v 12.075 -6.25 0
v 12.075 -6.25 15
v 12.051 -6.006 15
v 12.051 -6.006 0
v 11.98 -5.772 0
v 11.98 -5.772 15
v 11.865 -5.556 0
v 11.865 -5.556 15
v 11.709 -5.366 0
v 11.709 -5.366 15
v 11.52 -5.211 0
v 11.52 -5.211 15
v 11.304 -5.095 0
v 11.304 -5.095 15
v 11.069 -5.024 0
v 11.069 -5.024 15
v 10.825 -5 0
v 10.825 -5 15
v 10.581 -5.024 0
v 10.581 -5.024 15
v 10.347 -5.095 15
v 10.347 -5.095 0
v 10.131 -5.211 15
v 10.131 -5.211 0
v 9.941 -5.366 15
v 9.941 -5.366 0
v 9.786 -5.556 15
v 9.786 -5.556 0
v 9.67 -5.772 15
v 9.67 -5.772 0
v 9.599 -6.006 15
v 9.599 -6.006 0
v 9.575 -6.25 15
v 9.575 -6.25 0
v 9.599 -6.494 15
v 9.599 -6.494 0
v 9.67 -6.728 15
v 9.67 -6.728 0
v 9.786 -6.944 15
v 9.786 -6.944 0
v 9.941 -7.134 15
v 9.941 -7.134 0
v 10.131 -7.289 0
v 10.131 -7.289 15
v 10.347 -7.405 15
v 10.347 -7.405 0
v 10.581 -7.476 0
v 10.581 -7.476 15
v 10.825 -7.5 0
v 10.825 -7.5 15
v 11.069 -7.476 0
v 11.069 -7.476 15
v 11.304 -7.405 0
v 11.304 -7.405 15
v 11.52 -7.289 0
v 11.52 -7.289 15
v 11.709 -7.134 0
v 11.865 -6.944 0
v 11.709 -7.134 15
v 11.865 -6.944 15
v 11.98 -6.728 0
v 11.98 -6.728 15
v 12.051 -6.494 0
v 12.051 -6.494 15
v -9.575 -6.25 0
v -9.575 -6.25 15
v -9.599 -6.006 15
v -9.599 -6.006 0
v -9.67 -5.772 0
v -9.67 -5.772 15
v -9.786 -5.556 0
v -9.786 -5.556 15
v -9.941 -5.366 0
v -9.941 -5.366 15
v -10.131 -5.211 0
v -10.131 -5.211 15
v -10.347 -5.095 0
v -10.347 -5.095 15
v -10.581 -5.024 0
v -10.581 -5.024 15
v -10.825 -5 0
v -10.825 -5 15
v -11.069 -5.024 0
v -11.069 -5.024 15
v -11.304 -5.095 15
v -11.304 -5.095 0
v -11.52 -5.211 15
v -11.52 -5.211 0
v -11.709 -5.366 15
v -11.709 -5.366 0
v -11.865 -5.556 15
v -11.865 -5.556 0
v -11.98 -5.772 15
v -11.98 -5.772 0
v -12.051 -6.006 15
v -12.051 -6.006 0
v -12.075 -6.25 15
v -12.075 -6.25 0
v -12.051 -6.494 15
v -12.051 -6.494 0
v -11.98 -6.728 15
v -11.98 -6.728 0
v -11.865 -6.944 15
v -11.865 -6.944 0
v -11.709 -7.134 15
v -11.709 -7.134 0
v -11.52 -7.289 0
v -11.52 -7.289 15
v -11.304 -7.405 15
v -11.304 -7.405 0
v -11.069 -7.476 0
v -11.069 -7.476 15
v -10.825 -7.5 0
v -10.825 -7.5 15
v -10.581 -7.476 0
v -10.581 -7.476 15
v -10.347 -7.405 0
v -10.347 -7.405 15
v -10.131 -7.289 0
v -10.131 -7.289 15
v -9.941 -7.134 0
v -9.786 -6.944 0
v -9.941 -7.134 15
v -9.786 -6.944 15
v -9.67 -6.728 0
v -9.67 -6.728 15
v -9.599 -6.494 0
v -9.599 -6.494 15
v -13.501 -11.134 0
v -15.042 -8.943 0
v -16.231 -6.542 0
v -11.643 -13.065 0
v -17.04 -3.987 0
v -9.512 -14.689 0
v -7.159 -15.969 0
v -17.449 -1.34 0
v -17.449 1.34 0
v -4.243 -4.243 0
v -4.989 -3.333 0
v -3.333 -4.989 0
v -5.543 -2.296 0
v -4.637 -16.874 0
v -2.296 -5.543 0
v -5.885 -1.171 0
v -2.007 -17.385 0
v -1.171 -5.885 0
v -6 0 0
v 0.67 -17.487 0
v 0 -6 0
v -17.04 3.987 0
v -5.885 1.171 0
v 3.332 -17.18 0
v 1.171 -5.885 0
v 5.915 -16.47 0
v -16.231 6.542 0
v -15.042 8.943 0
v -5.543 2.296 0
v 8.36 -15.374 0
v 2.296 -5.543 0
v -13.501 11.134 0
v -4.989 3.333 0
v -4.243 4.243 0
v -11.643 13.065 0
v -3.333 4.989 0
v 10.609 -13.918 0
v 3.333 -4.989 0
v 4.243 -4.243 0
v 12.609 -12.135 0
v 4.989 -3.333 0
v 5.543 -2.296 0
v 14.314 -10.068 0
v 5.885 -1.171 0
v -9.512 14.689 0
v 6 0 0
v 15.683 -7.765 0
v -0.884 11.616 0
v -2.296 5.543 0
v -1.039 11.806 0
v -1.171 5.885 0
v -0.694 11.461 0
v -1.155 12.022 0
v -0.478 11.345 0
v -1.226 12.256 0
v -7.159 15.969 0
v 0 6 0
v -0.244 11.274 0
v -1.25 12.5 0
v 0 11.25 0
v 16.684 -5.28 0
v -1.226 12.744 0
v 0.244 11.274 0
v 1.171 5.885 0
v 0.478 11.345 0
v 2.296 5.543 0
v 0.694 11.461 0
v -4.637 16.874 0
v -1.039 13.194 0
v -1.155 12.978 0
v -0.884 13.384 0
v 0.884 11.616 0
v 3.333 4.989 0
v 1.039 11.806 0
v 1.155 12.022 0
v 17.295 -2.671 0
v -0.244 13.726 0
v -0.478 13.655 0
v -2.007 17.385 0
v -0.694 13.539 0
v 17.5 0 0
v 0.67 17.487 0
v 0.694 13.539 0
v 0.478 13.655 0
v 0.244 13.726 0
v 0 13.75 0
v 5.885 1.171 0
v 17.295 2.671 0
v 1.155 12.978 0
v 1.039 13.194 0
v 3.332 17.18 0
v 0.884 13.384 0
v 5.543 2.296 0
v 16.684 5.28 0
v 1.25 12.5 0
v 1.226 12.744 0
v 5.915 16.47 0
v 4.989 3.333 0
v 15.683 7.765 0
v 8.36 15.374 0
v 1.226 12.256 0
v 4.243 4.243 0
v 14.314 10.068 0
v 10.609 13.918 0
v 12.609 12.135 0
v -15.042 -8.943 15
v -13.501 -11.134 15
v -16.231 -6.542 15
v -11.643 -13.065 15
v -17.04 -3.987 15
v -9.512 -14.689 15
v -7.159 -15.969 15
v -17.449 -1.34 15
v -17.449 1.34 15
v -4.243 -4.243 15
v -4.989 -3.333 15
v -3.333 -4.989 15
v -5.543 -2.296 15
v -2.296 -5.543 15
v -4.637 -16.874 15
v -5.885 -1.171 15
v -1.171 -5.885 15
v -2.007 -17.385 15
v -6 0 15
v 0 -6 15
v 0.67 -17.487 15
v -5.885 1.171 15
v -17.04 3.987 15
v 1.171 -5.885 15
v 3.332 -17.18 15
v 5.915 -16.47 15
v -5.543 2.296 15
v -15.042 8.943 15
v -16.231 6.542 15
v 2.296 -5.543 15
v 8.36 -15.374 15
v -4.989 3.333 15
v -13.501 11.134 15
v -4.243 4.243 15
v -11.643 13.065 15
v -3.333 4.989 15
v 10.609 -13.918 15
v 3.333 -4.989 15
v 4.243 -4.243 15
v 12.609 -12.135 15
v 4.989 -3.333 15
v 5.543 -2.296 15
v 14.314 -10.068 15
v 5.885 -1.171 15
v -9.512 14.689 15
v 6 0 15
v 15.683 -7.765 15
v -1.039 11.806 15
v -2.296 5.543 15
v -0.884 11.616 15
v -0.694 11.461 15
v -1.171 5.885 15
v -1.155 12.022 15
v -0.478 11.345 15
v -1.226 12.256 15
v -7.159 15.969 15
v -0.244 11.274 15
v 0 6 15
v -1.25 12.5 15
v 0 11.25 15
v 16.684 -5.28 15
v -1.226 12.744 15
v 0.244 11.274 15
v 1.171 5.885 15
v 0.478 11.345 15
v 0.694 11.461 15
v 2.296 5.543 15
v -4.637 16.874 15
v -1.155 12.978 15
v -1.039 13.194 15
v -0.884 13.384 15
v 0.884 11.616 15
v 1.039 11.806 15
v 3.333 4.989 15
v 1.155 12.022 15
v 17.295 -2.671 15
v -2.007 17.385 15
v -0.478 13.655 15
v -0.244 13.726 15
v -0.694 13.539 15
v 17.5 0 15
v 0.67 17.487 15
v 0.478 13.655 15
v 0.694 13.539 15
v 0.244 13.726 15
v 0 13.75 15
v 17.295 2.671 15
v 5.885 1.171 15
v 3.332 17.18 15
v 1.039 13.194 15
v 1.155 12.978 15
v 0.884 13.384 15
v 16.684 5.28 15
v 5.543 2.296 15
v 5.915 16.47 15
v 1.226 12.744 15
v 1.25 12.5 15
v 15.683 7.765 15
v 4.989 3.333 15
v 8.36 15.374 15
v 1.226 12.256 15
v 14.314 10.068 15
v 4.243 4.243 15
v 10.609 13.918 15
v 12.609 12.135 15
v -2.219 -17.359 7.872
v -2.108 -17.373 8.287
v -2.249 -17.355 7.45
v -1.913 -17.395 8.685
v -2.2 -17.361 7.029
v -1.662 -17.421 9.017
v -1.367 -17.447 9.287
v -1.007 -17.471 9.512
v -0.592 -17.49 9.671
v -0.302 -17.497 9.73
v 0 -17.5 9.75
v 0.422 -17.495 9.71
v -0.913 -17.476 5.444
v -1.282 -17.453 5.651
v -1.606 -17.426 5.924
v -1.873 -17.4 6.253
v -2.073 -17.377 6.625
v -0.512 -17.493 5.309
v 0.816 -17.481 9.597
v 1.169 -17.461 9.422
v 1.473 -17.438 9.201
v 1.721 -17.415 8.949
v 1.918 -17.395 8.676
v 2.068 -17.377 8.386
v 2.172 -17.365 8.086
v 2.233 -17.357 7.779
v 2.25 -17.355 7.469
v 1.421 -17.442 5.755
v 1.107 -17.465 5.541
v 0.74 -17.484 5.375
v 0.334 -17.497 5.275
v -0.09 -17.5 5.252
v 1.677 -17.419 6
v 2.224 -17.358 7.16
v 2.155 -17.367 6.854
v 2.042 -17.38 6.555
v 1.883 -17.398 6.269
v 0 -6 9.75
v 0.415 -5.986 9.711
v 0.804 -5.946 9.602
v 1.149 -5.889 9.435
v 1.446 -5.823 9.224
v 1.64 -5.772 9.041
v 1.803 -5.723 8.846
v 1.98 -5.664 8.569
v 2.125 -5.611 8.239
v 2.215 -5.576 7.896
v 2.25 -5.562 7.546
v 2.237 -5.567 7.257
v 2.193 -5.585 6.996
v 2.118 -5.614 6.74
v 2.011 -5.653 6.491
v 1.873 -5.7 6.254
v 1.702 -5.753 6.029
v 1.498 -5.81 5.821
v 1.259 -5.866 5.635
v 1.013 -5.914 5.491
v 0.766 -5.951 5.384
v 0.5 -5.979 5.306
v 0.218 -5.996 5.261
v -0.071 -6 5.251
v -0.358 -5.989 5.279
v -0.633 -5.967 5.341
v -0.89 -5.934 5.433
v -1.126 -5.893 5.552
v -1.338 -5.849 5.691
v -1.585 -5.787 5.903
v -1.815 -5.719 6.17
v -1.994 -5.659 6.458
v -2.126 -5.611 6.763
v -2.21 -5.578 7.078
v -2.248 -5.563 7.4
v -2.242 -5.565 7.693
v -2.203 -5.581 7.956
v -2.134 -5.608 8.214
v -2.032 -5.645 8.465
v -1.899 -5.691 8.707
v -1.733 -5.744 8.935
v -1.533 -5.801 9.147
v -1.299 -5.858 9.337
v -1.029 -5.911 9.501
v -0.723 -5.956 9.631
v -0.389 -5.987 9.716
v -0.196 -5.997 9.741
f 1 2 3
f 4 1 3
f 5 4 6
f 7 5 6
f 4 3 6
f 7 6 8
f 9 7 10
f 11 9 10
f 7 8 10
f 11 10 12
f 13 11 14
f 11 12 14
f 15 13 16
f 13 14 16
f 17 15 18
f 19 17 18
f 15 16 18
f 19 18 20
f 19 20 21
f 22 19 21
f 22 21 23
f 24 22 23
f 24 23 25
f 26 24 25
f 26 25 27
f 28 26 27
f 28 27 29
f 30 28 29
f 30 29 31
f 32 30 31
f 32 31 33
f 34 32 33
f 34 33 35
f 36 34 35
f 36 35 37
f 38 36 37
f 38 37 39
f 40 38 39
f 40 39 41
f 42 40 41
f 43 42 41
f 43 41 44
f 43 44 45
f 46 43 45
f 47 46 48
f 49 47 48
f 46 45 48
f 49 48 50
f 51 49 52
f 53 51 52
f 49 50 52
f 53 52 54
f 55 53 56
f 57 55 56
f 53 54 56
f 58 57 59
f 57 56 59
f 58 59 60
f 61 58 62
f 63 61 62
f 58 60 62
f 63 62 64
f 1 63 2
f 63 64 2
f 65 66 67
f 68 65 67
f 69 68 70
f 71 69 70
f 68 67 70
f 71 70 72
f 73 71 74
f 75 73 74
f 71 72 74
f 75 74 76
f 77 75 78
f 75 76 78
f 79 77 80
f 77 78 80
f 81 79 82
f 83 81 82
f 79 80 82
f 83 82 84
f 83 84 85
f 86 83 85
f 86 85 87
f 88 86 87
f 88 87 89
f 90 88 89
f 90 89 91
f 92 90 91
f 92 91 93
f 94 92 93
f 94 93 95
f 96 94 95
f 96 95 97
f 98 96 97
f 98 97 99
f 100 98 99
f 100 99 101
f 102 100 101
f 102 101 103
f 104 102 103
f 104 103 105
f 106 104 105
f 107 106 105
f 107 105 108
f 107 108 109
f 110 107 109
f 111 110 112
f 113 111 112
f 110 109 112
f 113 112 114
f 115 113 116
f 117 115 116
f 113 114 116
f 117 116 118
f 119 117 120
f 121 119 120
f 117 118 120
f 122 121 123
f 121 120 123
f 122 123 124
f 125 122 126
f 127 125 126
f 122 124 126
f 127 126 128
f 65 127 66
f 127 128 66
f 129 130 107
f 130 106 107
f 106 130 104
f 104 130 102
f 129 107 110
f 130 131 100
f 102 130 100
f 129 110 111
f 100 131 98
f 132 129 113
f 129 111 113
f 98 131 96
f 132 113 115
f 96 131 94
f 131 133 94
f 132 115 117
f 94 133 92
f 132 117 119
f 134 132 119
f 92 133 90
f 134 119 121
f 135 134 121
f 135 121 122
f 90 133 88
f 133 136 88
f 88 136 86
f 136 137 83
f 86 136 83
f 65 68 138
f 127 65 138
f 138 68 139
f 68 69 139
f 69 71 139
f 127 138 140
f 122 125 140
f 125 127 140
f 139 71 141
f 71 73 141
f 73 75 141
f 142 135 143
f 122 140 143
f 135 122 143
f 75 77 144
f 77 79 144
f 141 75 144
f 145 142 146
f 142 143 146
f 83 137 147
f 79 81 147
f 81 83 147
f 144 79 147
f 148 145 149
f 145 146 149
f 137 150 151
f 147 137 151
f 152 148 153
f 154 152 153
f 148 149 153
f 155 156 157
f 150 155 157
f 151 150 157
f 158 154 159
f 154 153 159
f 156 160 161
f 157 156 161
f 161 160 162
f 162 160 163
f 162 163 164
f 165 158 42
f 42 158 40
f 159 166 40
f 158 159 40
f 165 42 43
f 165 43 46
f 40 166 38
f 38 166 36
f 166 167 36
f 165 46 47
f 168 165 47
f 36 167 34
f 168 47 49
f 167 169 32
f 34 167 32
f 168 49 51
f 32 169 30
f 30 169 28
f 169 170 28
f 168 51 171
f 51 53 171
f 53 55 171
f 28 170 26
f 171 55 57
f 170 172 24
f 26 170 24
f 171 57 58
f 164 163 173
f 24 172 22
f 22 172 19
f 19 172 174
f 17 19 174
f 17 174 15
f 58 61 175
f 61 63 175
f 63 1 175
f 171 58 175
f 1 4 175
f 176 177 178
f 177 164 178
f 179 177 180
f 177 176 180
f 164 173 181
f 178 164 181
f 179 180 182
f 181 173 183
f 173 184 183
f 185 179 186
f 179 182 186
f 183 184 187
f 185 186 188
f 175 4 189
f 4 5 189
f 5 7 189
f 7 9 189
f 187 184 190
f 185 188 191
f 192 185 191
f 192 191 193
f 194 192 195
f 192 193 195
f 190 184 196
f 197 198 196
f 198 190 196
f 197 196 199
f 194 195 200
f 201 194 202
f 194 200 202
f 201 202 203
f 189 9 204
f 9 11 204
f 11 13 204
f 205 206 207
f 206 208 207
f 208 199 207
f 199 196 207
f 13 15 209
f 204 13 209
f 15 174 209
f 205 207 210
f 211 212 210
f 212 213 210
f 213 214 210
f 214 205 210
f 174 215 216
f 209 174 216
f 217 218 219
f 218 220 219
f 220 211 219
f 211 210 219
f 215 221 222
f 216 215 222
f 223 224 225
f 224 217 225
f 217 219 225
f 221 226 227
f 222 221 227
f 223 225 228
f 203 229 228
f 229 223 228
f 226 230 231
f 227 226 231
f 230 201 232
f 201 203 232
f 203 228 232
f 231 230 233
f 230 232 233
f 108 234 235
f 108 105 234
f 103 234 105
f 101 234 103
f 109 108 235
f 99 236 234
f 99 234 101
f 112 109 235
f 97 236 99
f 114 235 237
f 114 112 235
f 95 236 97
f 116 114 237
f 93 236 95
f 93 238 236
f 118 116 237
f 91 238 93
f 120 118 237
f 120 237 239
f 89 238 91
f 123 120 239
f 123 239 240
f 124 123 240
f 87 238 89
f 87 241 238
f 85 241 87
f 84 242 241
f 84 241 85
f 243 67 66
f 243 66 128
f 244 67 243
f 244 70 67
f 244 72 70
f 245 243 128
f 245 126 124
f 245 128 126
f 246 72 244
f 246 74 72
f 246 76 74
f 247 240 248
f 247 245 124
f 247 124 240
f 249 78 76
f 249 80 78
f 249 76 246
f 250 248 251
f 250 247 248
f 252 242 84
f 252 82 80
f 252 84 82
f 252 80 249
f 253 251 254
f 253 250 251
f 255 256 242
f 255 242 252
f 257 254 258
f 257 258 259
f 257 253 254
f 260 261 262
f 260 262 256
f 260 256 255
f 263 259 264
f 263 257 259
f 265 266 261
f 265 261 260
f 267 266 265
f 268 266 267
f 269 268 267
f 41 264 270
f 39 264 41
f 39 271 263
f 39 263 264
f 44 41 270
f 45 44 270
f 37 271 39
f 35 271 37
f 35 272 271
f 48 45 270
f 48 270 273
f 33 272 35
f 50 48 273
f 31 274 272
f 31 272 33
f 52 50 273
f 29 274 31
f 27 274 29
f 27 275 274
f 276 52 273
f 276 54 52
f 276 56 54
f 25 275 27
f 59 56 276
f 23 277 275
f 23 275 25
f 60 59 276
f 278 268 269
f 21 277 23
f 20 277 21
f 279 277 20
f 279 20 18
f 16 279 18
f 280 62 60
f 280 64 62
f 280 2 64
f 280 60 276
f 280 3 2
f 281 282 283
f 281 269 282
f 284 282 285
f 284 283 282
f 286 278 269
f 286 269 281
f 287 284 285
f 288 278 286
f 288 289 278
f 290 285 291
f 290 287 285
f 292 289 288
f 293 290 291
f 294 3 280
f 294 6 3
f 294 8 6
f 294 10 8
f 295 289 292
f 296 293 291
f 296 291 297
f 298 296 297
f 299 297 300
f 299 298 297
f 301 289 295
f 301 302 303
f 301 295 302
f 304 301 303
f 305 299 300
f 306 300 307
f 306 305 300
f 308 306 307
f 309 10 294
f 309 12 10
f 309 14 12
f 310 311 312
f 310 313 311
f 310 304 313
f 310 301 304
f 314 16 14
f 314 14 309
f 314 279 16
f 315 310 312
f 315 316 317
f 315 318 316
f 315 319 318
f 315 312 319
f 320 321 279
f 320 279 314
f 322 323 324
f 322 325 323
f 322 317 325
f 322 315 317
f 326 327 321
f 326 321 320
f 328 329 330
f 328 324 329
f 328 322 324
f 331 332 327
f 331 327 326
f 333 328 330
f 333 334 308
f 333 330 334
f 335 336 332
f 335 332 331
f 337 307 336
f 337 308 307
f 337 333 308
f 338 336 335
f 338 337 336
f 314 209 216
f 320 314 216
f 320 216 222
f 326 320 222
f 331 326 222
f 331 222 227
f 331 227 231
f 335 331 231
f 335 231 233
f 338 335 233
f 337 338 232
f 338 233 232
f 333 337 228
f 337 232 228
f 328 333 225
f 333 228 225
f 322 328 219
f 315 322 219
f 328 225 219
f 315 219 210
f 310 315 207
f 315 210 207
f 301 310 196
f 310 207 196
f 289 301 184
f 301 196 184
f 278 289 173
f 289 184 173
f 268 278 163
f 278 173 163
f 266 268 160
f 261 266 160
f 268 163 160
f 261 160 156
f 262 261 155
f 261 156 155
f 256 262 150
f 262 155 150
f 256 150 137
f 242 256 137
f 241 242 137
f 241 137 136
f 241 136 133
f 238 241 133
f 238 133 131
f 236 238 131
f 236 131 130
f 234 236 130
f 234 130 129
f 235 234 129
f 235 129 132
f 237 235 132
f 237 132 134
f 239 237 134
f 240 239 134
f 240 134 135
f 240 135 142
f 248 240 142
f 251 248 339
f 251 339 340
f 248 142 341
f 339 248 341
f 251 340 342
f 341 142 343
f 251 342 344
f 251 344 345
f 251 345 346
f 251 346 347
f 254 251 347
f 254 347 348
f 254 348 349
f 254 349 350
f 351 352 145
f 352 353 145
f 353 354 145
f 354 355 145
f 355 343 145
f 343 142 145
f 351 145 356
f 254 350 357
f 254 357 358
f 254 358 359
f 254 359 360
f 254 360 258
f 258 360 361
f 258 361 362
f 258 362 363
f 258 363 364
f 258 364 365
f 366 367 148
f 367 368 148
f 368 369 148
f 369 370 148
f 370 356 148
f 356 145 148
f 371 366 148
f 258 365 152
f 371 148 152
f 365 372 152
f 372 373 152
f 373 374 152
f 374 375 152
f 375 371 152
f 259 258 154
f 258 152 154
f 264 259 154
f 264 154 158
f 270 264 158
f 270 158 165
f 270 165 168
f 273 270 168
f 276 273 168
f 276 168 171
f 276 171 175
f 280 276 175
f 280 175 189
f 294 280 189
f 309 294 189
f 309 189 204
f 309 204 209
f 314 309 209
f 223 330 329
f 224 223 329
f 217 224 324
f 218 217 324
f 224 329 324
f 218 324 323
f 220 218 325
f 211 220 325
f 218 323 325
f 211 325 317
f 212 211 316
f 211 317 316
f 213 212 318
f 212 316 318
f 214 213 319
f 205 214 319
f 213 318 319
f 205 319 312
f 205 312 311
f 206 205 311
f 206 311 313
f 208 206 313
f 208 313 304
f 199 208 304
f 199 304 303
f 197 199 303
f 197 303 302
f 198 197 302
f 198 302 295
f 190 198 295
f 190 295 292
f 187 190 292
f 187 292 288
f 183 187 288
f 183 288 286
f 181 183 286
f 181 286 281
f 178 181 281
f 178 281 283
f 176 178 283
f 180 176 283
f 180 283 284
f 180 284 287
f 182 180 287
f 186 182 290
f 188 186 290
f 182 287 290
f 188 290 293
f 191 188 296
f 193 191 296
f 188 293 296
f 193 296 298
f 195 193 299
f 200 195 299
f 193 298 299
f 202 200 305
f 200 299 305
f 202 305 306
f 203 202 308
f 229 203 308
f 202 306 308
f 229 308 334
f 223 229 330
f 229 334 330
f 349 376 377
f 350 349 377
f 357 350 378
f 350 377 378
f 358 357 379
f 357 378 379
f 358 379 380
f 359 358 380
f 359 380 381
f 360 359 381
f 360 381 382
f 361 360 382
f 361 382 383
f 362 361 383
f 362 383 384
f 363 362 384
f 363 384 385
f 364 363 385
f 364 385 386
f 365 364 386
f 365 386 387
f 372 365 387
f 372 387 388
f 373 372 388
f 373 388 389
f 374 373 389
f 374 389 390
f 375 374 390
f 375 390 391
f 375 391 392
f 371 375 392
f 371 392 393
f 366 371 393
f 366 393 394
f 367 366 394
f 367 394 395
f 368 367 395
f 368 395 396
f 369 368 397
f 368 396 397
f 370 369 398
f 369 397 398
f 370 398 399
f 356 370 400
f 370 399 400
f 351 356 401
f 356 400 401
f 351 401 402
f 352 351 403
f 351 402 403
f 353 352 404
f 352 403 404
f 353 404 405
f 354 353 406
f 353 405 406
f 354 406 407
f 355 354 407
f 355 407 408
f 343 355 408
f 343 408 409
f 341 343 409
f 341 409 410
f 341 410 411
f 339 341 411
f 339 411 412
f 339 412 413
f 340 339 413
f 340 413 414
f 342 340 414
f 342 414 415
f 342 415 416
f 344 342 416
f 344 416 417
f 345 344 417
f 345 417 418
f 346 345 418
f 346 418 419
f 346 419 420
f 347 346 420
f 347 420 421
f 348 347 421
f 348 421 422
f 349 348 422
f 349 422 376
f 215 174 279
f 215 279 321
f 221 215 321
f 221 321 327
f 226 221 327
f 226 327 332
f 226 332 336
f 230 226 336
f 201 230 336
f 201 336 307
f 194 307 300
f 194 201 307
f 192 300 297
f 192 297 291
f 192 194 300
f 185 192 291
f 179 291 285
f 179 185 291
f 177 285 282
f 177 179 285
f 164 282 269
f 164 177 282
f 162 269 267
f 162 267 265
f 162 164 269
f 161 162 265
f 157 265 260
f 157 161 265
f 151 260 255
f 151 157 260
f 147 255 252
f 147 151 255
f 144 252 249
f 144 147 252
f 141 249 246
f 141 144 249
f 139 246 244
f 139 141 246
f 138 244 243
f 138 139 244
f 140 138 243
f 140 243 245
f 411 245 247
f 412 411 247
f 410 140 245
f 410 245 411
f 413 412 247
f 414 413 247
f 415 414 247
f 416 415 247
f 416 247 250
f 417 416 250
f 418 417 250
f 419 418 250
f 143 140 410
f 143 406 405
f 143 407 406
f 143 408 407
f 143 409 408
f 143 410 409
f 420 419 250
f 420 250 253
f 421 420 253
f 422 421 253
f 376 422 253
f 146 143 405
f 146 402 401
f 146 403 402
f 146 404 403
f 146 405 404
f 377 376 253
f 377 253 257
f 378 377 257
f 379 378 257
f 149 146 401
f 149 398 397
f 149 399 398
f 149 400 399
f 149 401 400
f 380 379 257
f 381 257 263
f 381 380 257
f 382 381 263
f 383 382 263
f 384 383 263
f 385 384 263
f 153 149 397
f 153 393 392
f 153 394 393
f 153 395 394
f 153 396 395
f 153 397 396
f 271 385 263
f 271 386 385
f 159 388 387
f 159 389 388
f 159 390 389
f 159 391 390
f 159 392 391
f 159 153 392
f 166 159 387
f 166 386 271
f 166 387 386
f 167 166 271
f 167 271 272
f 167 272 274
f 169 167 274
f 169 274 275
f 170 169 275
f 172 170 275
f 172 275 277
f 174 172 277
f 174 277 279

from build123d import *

# Parameters (mm, degrees)
SKETCH1_R           = 17.5
SKETCH1_R_2         = 6
BOSS_EXTRUDE1_DEPTH = 15
SKETCH2_R           = 2.25
CUT_EXTRUDE1_DEPTH  = 29.939592257
SKETCH3_R           = 1.25
CUT_EXTRUDE2_DEPTH  = 29.93959243


with BuildPart() as part:
    # Sketch1 → Boss-Extrude1 (new body)
    with BuildSketch(Plane.XY):
        Circle(SKETCH1_R)
        Circle(SKETCH1_R_2, mode=Mode.SUBTRACT)
    extrude(amount=BOSS_EXTRUDE1_DEPTH)

    # Sketch2 → Cut-Extrude1 (cut, through all)
    with BuildSketch(Plane(origin=(0, 0, 0), x_dir=(1, 0, 0), z_dir=(0, 1, 0))):
        with Locations(Location((0, -7.5, 0), (0, 0, 270))):
            Circle(SKETCH2_R)
    extrude(amount=-CUT_EXTRUDE1_DEPTH, mode=Mode.SUBTRACT)

    # Sketch3 → Cut-Extrude2 (cut, through all)
    with BuildSketch(Plane.XY.offset(15)):
        with Locations((0, 12.5)):
            Circle(SKETCH3_R)
        with Locations((10.825317547, -6.25)):
            Circle(SKETCH3_R)
        with Locations((-10.825317547, -6.25)):
            Circle(SKETCH3_R)
    extrude(amount=-CUT_EXTRUDE2_DEPTH, mode=Mode.SUBTRACT)


solid = part.part
